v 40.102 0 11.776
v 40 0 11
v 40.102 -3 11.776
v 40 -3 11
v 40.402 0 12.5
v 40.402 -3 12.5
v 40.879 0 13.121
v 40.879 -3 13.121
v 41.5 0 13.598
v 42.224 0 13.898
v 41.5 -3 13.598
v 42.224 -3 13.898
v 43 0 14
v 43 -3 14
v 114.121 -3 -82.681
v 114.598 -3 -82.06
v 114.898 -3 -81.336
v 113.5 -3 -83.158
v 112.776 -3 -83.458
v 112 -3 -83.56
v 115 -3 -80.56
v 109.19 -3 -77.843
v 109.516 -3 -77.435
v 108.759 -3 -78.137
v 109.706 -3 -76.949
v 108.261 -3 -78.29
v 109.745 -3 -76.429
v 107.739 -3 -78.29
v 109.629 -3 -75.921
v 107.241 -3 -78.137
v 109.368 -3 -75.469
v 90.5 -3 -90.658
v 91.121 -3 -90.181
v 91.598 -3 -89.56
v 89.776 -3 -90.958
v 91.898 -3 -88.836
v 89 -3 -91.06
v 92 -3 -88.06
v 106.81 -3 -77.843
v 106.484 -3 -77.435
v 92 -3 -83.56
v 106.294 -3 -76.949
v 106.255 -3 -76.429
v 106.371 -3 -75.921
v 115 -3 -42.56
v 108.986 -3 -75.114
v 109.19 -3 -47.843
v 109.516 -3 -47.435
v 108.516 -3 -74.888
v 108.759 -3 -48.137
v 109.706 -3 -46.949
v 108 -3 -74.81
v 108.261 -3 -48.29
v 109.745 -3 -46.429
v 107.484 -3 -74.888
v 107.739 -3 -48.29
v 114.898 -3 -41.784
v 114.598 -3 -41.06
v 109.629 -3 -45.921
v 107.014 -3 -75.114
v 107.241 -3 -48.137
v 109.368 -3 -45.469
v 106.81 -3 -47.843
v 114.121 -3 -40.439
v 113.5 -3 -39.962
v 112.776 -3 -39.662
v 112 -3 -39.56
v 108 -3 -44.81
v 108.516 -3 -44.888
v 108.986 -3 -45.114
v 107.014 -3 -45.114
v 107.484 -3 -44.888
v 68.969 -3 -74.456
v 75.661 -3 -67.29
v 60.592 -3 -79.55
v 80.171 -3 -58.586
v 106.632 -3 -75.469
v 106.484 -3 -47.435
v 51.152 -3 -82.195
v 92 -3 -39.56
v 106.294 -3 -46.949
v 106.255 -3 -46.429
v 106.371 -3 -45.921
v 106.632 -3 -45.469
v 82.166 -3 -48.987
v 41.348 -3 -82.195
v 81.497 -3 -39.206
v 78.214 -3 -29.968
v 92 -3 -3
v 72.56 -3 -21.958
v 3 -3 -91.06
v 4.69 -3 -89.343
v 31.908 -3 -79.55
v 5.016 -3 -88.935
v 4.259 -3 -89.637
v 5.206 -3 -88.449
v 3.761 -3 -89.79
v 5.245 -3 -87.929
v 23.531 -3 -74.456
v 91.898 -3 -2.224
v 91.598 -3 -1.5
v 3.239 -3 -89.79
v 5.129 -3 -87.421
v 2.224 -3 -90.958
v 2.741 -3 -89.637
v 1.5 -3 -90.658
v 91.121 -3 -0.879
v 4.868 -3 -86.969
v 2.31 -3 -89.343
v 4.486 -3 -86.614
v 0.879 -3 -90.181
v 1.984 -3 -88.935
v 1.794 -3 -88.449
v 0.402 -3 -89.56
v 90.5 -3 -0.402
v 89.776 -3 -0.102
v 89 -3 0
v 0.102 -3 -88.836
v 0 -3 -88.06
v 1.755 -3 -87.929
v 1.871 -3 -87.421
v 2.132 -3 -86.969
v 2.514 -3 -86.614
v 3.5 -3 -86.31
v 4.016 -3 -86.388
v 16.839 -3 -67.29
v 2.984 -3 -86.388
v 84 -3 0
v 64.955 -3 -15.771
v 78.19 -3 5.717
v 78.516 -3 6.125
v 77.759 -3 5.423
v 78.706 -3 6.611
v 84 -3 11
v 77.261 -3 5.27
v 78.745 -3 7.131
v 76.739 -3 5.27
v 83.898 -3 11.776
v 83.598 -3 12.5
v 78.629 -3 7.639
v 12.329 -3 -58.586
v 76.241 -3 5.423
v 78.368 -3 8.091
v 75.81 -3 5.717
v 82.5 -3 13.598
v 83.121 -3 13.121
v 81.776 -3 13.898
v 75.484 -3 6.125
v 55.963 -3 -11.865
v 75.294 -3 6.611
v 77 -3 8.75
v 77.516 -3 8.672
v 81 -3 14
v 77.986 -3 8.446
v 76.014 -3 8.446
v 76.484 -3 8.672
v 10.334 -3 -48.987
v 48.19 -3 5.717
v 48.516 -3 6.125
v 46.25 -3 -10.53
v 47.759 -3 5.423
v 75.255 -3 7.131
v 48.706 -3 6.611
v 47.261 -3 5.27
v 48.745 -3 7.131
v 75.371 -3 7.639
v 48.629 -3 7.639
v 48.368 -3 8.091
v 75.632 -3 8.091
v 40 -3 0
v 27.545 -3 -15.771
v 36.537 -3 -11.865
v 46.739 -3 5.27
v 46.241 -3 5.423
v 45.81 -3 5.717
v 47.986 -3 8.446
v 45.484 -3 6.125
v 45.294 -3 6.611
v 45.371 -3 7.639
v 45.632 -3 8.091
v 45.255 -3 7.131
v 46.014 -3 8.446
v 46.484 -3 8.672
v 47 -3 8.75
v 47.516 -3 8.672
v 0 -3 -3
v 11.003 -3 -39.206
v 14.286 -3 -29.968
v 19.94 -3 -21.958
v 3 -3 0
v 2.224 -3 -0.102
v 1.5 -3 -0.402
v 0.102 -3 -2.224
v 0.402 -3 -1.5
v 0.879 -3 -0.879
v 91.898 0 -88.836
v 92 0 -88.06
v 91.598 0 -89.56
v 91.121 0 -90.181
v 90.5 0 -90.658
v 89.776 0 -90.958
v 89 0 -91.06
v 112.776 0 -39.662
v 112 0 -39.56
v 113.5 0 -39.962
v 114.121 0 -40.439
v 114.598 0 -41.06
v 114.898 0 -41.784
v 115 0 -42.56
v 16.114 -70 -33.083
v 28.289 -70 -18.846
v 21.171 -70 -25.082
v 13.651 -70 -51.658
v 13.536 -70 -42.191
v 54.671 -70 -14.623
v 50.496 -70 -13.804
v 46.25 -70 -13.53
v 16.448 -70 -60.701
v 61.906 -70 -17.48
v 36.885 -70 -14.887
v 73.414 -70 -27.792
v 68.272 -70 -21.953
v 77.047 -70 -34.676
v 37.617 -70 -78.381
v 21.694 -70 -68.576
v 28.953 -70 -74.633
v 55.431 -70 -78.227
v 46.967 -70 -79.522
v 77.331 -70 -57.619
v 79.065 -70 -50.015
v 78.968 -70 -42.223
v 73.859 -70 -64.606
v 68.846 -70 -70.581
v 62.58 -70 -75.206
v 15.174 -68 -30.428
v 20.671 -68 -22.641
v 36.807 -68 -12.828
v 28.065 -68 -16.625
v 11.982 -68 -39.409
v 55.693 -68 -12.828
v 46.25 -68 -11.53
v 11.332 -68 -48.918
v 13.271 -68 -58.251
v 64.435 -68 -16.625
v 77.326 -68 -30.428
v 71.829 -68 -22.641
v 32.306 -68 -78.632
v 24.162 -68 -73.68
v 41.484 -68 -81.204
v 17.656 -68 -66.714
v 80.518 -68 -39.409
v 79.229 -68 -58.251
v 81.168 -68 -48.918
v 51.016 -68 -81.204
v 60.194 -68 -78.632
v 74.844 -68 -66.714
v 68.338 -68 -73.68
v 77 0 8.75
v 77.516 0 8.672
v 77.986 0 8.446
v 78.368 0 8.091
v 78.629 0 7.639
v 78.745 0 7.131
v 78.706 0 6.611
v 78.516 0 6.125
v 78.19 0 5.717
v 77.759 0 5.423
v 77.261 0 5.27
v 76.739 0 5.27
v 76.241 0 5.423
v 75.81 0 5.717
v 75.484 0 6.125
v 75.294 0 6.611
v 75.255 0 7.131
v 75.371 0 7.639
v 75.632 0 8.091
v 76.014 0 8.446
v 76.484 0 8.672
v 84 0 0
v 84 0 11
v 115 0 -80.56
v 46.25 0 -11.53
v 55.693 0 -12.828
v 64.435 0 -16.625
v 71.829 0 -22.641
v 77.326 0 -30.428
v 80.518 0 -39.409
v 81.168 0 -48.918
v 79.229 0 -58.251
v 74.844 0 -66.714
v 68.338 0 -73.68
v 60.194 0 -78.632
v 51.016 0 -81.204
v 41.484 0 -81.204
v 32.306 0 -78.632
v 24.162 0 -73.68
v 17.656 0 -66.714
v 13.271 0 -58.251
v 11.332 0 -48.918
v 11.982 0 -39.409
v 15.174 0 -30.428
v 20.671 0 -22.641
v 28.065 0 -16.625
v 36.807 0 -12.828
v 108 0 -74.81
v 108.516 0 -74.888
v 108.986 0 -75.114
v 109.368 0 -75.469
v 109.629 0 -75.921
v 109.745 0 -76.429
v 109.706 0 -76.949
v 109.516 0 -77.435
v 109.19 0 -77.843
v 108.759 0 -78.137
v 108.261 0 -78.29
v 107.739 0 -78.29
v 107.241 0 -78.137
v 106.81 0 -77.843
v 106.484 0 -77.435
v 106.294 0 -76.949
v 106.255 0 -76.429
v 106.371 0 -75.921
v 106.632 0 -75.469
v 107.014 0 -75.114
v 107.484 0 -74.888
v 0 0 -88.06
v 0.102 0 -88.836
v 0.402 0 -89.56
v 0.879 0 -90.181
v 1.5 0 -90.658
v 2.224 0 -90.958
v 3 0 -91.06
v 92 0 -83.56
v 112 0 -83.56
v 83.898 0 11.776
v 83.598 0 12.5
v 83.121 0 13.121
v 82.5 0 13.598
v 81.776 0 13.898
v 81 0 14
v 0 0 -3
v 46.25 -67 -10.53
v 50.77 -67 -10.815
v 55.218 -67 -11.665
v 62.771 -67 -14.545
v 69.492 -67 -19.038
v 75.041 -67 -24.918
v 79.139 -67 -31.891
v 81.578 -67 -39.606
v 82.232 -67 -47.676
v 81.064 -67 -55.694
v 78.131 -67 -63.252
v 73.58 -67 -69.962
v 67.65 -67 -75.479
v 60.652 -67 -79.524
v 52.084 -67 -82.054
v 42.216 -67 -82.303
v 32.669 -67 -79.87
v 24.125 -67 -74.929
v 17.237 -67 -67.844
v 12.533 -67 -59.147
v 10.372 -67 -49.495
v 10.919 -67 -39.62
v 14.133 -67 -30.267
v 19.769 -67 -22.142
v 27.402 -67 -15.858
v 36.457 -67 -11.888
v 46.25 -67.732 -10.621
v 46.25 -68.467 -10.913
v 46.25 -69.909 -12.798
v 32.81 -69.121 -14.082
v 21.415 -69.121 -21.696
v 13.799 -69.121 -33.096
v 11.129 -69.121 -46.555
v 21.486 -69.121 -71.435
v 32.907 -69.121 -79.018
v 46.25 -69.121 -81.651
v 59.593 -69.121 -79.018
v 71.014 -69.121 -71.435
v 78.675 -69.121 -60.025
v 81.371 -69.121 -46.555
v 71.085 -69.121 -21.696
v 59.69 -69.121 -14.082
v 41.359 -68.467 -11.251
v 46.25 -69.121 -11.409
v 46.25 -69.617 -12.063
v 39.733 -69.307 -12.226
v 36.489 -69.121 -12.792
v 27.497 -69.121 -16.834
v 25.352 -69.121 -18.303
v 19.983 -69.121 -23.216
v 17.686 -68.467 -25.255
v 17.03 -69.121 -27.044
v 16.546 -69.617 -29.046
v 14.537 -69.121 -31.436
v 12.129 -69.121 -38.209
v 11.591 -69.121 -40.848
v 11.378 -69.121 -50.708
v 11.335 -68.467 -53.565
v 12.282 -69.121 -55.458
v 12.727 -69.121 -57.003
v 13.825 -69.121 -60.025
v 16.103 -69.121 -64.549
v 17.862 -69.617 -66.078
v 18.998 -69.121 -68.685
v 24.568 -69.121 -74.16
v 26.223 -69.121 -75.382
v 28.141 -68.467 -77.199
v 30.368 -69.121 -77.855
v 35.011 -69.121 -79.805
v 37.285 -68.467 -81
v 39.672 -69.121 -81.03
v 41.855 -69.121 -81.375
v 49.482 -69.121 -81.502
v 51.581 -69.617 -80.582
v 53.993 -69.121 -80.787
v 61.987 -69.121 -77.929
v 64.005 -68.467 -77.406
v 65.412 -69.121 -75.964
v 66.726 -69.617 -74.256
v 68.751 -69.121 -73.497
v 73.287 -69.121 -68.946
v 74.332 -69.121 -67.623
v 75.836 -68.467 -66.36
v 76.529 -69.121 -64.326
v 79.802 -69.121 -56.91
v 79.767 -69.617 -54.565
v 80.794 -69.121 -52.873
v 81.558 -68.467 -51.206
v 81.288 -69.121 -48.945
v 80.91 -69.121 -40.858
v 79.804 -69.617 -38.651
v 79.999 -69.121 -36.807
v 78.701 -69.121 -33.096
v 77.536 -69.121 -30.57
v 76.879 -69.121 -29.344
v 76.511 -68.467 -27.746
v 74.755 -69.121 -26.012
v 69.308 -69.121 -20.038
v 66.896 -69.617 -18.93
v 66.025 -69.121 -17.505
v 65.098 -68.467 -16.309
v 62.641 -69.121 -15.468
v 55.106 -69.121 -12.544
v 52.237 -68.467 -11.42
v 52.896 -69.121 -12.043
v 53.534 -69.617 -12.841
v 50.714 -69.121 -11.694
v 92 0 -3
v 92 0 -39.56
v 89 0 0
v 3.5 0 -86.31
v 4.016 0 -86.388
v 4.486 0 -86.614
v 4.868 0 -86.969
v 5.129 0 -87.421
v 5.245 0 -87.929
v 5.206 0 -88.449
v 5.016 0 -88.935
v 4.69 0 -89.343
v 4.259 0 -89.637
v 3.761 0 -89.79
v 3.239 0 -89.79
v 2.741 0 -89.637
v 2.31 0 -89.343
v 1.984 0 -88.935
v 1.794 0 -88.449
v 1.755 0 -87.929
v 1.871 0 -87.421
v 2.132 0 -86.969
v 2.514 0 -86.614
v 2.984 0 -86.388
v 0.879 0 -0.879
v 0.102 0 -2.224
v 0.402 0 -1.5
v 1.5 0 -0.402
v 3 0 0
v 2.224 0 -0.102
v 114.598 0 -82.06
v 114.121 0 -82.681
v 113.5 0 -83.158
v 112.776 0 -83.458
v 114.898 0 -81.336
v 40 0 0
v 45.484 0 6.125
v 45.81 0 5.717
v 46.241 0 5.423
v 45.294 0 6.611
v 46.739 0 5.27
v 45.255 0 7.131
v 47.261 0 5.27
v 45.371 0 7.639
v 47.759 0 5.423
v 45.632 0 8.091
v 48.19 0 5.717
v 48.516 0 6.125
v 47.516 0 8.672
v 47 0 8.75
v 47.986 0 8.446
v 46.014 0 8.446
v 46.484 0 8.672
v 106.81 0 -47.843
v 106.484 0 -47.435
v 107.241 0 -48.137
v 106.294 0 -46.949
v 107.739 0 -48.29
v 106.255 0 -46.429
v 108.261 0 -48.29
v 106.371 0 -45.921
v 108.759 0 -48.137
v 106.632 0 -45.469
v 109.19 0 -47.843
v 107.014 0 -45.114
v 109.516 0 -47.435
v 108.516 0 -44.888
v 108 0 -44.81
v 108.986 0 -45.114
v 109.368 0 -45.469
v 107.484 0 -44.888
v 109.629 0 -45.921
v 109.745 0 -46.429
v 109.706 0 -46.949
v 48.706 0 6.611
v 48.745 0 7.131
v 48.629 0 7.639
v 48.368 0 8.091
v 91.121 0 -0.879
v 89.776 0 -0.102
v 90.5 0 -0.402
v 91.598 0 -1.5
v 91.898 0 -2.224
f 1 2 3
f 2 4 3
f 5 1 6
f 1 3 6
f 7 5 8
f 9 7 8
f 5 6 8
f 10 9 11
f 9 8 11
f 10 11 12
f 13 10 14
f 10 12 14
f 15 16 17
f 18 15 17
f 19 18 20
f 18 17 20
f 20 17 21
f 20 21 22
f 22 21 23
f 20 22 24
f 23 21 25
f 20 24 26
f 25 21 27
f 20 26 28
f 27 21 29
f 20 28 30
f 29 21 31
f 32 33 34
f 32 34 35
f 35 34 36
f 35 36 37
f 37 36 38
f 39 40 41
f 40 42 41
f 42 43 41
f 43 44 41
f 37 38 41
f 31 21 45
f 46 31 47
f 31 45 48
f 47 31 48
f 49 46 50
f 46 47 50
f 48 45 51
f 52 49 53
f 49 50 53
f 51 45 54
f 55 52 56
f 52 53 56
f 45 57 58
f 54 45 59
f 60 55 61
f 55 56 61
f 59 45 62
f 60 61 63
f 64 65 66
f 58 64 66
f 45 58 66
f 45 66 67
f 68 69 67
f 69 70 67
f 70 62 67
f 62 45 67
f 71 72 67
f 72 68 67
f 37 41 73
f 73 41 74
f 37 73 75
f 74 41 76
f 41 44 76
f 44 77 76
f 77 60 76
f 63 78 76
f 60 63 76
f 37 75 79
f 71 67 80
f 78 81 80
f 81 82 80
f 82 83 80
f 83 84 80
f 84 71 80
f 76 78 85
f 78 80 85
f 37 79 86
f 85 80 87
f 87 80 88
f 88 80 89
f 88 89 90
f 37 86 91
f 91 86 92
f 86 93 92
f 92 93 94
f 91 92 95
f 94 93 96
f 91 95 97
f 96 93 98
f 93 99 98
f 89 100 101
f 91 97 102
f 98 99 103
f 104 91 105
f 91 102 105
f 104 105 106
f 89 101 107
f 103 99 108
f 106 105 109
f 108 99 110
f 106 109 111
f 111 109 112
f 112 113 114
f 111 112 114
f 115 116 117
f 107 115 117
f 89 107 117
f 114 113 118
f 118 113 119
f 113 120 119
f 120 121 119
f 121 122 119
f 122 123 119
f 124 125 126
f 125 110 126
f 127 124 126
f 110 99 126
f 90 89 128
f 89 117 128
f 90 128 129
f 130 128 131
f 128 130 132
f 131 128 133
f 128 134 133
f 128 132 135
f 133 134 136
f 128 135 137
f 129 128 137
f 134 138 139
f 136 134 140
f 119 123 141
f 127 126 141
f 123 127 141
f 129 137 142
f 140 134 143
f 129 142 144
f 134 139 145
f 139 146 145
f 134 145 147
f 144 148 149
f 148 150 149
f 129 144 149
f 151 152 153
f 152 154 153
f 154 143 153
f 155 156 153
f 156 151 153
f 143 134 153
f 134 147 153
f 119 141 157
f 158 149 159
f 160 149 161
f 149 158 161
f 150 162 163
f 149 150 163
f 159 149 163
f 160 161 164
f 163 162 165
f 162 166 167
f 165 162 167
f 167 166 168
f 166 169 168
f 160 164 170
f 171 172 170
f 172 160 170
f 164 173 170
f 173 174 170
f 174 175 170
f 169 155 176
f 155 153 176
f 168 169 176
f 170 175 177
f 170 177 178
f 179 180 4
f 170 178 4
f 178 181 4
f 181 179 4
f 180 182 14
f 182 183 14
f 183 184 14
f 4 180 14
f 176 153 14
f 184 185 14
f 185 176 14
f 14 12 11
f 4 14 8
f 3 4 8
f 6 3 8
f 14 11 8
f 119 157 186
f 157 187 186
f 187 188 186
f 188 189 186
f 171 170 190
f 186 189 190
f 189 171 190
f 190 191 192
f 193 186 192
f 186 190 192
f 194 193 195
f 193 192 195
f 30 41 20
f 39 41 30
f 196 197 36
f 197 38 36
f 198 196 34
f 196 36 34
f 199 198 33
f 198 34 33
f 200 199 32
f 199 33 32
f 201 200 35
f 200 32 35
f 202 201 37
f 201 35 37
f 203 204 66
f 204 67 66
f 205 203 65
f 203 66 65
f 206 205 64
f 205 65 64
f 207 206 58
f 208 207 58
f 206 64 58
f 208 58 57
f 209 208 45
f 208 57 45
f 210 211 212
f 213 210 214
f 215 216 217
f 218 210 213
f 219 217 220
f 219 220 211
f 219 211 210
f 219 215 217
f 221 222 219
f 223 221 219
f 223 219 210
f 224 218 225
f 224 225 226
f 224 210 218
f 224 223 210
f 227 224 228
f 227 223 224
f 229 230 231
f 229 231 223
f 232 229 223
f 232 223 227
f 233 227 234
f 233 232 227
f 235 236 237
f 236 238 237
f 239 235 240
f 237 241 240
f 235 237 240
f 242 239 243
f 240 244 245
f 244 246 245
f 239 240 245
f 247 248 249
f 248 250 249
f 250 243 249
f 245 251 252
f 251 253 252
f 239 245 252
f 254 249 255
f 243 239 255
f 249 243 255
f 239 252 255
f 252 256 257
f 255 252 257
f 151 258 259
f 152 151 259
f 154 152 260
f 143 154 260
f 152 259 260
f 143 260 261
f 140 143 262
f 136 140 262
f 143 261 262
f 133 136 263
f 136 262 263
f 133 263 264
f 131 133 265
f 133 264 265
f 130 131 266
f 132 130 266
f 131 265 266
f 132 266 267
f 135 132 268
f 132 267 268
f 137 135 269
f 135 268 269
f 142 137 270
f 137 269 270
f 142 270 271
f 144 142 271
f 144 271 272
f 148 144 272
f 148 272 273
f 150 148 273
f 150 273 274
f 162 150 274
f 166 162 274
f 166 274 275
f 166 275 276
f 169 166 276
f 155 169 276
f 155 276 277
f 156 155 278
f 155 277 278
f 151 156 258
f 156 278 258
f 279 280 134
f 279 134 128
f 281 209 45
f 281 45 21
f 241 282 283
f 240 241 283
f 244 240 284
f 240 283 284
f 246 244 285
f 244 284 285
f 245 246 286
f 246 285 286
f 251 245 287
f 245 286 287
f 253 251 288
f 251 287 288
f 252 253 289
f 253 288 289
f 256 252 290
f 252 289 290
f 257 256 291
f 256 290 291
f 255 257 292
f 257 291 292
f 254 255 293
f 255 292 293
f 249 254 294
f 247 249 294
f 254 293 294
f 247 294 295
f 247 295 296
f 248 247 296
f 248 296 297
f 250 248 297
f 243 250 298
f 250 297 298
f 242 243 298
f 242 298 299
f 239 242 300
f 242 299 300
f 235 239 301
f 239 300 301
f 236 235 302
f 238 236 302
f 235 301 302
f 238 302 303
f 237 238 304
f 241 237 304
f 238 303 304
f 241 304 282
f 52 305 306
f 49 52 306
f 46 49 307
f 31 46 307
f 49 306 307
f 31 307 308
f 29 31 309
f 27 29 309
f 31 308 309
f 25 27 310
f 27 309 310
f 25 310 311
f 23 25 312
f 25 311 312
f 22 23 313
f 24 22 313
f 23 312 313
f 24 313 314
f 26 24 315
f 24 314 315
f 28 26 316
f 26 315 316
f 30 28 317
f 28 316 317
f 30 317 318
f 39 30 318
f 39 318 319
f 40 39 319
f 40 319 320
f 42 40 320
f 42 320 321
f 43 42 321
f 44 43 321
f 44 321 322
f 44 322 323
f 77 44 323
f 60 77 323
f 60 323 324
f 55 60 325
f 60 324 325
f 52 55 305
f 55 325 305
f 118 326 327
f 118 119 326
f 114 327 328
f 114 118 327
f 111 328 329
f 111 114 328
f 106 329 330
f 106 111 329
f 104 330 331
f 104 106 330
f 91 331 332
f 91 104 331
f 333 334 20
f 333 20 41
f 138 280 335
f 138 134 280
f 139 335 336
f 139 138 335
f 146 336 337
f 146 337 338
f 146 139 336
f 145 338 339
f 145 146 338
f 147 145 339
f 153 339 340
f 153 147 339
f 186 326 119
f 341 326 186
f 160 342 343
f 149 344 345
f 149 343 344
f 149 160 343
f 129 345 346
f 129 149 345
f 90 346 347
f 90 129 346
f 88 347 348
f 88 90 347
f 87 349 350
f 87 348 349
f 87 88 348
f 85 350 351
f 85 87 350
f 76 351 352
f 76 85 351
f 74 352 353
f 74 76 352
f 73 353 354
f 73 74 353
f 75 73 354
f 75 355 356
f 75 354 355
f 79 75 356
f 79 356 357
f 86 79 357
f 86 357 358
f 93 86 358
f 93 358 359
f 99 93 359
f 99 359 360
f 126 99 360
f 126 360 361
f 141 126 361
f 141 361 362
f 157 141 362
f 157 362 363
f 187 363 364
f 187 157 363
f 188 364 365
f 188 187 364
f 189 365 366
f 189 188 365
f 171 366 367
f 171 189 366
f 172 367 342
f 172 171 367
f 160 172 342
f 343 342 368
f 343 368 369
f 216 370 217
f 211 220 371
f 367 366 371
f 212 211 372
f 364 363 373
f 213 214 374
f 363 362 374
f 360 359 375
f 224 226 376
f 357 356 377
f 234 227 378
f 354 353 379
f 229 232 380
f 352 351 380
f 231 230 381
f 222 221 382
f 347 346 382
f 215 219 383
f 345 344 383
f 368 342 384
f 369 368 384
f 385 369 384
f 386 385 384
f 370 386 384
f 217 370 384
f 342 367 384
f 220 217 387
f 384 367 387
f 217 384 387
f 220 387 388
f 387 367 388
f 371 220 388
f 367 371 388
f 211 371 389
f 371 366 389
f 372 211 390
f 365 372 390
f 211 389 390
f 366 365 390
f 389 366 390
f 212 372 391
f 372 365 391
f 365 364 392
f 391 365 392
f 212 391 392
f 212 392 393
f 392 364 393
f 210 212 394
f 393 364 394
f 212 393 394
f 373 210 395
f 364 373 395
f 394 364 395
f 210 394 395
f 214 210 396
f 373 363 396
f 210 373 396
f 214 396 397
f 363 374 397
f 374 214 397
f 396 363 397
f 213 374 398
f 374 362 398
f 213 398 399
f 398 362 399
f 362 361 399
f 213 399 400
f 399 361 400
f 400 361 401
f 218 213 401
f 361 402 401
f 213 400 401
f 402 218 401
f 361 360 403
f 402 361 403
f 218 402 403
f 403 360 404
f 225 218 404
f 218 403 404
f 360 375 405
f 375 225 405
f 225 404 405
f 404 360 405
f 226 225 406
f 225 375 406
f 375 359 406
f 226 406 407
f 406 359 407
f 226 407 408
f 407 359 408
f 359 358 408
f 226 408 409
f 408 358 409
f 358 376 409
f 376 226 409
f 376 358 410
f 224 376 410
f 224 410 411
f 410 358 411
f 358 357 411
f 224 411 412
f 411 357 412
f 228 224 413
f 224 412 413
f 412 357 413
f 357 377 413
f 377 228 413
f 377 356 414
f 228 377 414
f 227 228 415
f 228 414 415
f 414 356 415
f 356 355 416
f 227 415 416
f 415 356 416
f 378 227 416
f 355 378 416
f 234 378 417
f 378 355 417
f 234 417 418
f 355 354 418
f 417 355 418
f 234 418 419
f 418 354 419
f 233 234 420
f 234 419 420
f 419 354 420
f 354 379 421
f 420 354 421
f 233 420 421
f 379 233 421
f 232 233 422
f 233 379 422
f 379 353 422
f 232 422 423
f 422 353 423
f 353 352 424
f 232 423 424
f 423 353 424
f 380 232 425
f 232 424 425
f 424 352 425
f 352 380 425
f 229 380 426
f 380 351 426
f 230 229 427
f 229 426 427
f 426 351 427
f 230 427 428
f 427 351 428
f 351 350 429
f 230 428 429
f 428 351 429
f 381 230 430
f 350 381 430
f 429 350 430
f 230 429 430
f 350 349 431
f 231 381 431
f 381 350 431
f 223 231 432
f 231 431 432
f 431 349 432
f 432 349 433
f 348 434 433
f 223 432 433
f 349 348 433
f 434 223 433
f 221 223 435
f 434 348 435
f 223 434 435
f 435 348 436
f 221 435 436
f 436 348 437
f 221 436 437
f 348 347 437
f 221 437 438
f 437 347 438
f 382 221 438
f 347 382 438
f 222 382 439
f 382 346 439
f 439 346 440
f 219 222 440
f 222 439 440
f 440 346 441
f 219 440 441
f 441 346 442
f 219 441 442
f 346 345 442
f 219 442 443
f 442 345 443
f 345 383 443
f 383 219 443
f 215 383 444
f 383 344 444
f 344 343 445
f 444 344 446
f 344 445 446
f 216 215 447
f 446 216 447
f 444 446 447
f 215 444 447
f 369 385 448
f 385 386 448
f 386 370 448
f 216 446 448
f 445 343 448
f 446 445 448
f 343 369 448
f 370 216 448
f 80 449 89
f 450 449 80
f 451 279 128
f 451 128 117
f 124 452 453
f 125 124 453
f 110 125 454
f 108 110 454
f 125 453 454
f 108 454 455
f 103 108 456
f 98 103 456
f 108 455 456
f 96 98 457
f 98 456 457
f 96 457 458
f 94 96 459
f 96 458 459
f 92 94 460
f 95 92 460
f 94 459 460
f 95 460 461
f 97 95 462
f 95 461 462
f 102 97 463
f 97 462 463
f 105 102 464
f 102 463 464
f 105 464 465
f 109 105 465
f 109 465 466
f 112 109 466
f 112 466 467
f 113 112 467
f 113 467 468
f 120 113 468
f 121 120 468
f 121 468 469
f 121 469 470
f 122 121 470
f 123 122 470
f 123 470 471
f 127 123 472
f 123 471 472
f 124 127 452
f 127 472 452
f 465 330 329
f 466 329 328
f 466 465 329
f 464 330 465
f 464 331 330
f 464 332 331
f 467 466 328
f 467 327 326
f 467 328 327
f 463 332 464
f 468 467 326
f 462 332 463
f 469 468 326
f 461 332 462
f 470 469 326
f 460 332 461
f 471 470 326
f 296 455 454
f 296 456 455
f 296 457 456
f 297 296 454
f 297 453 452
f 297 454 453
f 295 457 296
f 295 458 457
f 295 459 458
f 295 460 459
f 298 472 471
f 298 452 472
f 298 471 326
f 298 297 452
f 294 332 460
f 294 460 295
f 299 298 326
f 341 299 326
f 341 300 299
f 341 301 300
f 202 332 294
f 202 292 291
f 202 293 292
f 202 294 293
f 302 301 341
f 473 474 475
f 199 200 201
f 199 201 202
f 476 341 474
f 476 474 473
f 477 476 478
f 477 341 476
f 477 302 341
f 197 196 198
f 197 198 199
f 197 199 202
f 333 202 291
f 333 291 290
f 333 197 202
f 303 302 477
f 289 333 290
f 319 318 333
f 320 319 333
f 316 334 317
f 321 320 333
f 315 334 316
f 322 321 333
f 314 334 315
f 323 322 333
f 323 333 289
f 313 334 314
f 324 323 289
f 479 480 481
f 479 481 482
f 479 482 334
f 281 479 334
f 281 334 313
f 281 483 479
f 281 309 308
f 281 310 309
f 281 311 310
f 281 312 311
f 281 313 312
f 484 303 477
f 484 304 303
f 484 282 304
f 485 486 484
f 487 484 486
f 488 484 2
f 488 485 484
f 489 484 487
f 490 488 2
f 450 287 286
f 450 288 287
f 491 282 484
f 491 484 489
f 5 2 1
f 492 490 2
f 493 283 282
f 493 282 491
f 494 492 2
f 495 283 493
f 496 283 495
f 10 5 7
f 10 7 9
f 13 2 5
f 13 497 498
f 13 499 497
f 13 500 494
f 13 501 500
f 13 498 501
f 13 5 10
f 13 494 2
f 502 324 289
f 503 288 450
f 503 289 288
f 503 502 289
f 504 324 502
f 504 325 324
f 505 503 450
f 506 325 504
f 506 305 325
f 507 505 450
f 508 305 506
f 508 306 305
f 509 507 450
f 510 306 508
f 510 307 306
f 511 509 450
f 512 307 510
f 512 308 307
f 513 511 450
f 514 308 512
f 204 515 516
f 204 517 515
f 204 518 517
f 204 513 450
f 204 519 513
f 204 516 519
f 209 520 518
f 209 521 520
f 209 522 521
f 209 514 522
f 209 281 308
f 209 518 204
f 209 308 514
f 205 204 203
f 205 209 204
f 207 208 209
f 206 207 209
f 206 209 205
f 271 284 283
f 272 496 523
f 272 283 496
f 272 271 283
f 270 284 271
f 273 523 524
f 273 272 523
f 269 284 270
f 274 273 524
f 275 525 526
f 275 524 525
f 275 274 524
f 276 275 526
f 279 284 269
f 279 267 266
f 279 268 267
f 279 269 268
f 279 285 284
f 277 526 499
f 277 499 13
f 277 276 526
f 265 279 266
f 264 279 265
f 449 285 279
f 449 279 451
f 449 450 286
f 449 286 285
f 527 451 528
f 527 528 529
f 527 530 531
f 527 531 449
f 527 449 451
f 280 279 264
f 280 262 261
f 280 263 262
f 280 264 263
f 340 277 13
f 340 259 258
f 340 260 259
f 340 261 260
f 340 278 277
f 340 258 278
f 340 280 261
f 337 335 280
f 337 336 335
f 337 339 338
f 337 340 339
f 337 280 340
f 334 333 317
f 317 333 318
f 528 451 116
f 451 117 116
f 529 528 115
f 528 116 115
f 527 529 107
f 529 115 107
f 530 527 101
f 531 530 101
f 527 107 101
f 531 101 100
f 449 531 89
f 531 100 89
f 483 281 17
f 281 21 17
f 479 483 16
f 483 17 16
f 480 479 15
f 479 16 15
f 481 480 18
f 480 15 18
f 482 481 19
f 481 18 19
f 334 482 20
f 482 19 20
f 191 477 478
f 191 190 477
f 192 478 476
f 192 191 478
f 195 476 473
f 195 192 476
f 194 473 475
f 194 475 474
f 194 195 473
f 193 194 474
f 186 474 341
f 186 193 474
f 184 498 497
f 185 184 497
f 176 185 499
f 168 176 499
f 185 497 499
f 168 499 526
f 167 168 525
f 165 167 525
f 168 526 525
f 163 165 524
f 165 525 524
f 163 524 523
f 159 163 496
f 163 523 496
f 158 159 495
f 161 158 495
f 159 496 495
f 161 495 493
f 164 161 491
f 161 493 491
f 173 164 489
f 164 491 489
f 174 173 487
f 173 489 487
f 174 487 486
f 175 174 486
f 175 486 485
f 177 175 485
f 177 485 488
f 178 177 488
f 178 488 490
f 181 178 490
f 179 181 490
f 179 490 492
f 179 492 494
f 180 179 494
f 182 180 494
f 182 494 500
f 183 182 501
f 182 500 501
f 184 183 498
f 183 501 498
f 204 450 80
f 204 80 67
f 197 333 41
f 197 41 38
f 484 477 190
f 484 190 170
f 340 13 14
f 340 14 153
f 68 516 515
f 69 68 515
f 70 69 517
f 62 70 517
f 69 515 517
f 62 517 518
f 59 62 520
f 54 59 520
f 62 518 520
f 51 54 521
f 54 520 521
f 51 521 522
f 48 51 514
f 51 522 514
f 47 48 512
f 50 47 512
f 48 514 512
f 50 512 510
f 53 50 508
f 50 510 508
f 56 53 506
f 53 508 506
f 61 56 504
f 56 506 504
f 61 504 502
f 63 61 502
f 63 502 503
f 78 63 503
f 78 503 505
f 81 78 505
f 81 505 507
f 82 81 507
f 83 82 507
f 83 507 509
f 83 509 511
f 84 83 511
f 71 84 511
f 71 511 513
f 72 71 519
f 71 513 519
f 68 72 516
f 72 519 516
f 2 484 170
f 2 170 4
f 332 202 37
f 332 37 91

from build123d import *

# Parameters (mm, degrees)
ESQUISSE1_R        = 1.75
BOSS_EXTRU_1_DEPTH = 3
ESQUISSE2_R        = 36
BOSS_EXTRU_4_DEPTH = 0.5
ESQUISSE5_R        = 36
ESQUISSE5_R_2      = 35
BOSS_EXTRU_6_DEPTH = 68
ESQUISSE6_R        = 36
BOSS_EXTRU_7_DEPTH = 2
CONG_7_R           = 3
CONG_8_R           = 3
CONG_9_R           = 3
CONG_10_R          = 3
CONG_11_R          = 3
CONG_12_R          = 3
CONG_13_R          = 3
CONG_15_R          = 3
CONG_16_R          = 3
ESQUISSE7_R        = 36.000000001
BOSS_EXTRU_9_DEPTH = 2.5


with BuildPart() as part:
    # Esquisse1 → Boss.-Extru.1 (new body)
    with BuildSketch(Plane(origin=(0, 0, 0), x_dir=(1, 0, 0), z_dir=(0, 1, 0))):
        Polygon((0, 91.06), (0, 0), (40, 0), (40, -14), (84, -14), (84, 0), (92, 0), (92, 39.56), (115, 39.56), (115, 83.56), (92, 83.56), (92, 91.06), align=None)
        with Locations(Location((108, 46.56, 0), (0, 0, 270))):
            Circle(ESQUISSE1_R, mode=Mode.SUBTRACT)
        with Locations(Location((108, 76.56, 0), (0, 0, 270))):
            Circle(ESQUISSE1_R, mode=Mode.SUBTRACT)
        with Locations(Location((3.5, 88.06, 0), (0, 0, 270))):
            Circle(ESQUISSE1_R, mode=Mode.SUBTRACT)
        with Locations(Location((77, -7, 0), (0, 0, 270))):
            Circle(ESQUISSE1_R, mode=Mode.SUBTRACT)
        with Locations(Location((47, -7, 0), (0, 0, 270))):
            Circle(ESQUISSE1_R, mode=Mode.SUBTRACT)
        Polygon((11.27, 87.06), (88, 87.06), (88, 6), (4.5, 6), (4.5, 73.06), (11.27, 73.06), align=None, mode=Mode.SUBTRACT)
    extrude(amount=-BOSS_EXTRU_1_DEPTH)

    # Esquisse2 → Boss.-Extru.4 (add)
    with BuildSketch(Plane(origin=(0, 0, 0), x_dir=(1, 0, 0), z_dir=(0, 1, 0))):
        Polygon((11.27, 73.06), (4.5, 73.06), (4.5, 6), (88, 6), (88, 87.06), (11.27, 87.06), align=None)
        with Locations(Location((46.25, 46.53, 0), (0, 0, 270))):
            Circle(ESQUISSE2_R, mode=Mode.SUBTRACT)
    extrude(amount=-BOSS_EXTRU_4_DEPTH)

    # Esquisse5 → Boss.-Extru.6 (add)
    with BuildSketch(Plane(origin=(0, 0, 0), x_dir=(1, 0, 0), z_dir=(0, 1, 0))):
        with Locations(Location((46.25, 46.53, 0), (0, 0, 270))):
            Circle(ESQUISSE5_R)
        with Locations(Location((46.25, 46.53, 0), (0, 0, 270))):
            Circle(ESQUISSE5_R_2, mode=Mode.SUBTRACT)
    extrude(amount=-BOSS_EXTRU_6_DEPTH)

    # Esquisse6 → Boss.-Extru.7 (add)
    with BuildSketch(Plane.XZ.offset(68)):
        with Locations(Location((46.25, -46.53, 0), (0, 0, 270))):
            Circle(ESQUISSE6_R)
    extrude(amount=BOSS_EXTRU_7_DEPTH)

    # Congé7
    cong_7_edges = [part.edges().sort_by_distance(p)[0] for p in [
        (0, -1.5, -91.06),
    ]]
    fillet(cong_7_edges, radius=CONG_7_R)

    # Congé8
    cong_8_edges = [part.edges().sort_by_distance(p)[0] for p in [
        (40, -1.5, 14),
    ]]
    fillet(cong_8_edges, radius=CONG_8_R)

    # Congé9
    cong_9_edges = [part.edges().sort_by_distance(p)[0] for p in [
        (0, -1.5, 0),
    ]]
    fillet(cong_9_edges, radius=CONG_9_R)

    # Congé10
    cong_10_edges = [part.edges().sort_by_distance(p)[0] for p in [
        (92, -1.5, 0),
    ]]
    fillet(cong_10_edges, radius=CONG_10_R)

    # Congé11
    cong_11_edges = [part.edges().sort_by_distance(p)[0] for p in [
        (84, -1.5, 14),
    ]]
    fillet(cong_11_edges, radius=CONG_11_R)

    # Congé12
    cong_12_edges = [part.edges().sort_by_distance(p)[0] for p in [
        (115, -1.5, -39.56),
    ]]
    fillet(cong_12_edges, radius=CONG_12_R)

    # Congé13
    cong_13_edges = [part.edges().sort_by_distance(p)[0] for p in [
        (115, -1.5, -83.56),
    ]]
    fillet(cong_13_edges, radius=CONG_13_R)

    # Congé15
    cong_15_edges = [part.edges().sort_by_distance(p)[0] for p in [
        (92, -1.5, -91.06),
    ]]
    fillet(cong_15_edges, radius=CONG_15_R)

    # Congé16
    cong_16_edges = [part.edges().sort_by_distance(p)[0] for p in [
        (46.25, -70, -10.53),
    ]]
    fillet(cong_16_edges, radius=CONG_16_R)

    # Esquisse7 → Boss.-Extru.9 (add)
    with BuildSketch(Plane.XZ.offset(0.5)):
        Polygon((4.5, -6), (88, -6), (88, -87.06), (11.27, -87.06), (11.27, -73.06), (4.5, -73.06), align=None)
        with Locations(Location((46.25, -46.53, 0), (0, 0, 270))):
            Circle(ESQUISSE7_R, mode=Mode.SUBTRACT)
    extrude(amount=BOSS_EXTRU_9_DEPTH)


solid = part.part
